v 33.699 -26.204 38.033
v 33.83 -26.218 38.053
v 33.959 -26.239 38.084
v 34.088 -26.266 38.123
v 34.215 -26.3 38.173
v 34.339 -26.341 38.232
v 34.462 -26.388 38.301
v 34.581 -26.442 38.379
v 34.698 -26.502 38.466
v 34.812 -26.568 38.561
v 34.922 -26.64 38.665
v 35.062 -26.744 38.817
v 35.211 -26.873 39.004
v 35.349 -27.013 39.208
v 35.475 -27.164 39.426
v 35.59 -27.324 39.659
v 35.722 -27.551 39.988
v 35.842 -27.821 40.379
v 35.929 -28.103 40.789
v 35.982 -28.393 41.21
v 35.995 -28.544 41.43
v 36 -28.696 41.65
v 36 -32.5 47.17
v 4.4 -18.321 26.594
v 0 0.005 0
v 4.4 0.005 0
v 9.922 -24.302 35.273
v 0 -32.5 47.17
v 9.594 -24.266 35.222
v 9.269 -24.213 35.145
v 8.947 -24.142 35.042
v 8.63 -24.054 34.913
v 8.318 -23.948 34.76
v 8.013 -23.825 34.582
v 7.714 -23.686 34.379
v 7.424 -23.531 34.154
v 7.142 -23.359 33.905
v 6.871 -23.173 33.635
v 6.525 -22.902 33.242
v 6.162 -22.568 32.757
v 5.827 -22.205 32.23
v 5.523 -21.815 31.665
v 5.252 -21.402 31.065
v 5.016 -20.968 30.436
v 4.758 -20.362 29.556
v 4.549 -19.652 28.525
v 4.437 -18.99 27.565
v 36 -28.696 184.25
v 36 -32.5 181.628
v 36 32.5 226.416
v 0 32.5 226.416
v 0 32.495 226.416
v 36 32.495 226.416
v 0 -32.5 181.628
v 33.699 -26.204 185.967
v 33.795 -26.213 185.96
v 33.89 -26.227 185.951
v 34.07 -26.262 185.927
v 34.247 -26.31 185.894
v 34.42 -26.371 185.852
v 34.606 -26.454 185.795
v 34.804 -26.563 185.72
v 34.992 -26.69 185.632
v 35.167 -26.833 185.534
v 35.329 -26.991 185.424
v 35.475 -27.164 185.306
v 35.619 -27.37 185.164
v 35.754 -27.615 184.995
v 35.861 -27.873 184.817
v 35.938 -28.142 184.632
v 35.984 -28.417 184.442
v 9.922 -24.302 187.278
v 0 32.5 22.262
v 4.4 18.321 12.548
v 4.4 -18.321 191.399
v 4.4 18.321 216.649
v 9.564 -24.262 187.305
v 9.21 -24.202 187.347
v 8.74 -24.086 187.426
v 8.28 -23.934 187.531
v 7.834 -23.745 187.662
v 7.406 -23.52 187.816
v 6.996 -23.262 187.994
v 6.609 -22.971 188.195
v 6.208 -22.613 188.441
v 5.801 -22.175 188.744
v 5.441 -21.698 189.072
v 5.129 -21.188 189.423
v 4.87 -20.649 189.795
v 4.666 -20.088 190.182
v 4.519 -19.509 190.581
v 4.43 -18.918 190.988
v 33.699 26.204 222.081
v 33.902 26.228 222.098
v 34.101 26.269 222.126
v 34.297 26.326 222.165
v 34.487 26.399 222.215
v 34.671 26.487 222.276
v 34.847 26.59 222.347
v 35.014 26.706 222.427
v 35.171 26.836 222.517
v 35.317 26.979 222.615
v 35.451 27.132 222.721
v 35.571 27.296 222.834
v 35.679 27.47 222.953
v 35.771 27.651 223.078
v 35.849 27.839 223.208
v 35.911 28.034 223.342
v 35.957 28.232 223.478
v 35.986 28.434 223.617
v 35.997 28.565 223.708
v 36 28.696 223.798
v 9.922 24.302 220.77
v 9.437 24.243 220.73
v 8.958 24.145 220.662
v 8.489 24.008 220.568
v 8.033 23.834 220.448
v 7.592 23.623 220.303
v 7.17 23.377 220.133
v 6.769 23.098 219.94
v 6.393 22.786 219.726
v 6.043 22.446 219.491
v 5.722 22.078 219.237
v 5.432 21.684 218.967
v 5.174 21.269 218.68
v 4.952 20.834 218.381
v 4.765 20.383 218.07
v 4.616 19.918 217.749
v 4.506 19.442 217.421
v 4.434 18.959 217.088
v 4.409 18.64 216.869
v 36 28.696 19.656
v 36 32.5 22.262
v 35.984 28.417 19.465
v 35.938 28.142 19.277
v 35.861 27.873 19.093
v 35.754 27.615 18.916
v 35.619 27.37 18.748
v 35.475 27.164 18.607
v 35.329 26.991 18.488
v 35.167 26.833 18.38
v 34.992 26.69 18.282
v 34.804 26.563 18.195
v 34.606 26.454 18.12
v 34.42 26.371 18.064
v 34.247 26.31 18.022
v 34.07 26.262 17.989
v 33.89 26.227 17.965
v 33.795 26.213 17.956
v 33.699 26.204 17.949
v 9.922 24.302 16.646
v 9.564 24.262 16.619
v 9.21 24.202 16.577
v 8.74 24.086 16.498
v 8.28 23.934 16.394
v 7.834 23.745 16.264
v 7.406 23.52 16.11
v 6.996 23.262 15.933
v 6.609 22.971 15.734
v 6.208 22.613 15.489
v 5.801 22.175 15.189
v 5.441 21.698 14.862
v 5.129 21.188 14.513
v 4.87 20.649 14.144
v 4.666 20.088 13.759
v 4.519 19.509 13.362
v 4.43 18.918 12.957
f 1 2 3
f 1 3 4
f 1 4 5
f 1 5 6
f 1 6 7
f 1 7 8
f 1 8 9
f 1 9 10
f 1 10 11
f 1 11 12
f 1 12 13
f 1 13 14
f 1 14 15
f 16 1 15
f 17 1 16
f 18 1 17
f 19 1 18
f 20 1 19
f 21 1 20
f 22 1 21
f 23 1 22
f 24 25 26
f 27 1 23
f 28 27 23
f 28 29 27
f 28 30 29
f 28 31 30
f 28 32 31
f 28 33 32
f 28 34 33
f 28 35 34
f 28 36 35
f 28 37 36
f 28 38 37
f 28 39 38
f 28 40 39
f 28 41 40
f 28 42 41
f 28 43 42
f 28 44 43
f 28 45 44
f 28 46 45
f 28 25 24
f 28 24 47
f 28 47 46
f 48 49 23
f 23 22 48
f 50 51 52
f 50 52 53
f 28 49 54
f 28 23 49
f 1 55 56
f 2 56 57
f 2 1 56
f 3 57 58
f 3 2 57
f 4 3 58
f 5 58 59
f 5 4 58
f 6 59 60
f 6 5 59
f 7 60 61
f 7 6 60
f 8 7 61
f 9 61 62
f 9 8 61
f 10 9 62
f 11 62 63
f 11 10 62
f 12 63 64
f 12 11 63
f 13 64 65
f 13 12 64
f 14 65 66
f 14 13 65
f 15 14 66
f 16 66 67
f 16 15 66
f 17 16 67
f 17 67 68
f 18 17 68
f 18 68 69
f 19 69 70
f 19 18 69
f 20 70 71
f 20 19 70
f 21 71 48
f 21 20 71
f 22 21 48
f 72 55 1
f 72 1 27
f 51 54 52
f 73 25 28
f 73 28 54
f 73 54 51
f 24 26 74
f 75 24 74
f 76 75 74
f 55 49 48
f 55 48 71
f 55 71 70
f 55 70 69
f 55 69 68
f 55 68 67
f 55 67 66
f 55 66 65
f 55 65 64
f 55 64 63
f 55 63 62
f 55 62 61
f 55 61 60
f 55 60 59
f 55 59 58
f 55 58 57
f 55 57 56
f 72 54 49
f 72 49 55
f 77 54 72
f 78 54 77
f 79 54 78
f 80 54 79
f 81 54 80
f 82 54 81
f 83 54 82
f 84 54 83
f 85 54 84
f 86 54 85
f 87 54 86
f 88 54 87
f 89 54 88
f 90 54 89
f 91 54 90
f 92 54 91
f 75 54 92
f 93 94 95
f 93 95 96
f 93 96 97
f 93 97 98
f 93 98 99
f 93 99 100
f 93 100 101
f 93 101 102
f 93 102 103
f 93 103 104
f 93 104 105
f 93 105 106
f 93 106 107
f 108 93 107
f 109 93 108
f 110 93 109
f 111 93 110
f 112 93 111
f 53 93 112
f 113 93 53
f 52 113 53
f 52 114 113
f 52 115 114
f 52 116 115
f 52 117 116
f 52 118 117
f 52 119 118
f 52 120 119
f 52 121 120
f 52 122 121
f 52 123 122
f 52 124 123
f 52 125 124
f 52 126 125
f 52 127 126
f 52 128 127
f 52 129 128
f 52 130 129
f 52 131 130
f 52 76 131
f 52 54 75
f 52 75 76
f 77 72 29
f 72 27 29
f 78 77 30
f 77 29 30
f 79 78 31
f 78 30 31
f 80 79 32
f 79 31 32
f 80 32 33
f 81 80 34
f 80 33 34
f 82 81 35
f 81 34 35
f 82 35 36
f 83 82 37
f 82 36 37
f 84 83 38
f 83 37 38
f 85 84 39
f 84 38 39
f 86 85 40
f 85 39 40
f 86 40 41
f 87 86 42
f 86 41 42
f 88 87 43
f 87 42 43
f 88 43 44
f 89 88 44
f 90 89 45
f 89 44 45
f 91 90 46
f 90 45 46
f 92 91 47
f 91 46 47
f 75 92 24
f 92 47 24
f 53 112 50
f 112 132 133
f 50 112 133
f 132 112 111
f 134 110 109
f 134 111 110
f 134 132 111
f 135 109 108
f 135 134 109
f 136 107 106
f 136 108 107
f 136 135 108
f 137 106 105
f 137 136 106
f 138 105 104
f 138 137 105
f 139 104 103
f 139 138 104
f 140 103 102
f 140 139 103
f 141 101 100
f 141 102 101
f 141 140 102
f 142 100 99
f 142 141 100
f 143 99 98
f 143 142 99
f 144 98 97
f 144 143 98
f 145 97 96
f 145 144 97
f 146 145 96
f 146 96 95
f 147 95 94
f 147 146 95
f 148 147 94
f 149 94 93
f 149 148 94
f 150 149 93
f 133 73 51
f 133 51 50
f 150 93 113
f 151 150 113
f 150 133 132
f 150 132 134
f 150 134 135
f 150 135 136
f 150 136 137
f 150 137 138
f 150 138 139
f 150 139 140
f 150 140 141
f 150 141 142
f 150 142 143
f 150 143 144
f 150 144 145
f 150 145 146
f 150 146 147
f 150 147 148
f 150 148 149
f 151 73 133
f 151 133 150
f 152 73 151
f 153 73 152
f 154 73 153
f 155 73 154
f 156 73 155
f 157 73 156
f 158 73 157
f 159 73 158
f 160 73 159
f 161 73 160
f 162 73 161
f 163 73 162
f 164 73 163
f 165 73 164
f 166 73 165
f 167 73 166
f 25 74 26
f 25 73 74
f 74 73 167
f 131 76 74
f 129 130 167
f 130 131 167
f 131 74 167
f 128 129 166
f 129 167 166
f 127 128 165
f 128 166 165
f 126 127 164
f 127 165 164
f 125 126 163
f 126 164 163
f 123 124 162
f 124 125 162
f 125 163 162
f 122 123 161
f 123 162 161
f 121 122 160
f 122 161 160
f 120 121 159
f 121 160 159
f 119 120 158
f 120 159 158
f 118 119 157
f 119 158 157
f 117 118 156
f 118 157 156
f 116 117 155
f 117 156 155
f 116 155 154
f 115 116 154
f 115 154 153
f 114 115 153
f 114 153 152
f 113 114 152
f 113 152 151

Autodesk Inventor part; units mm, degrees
ref_plane "Начальная плоскость" through (0, 0, 0) normal (0, 0, 1) x (1, 0, 0)
ref_plane "Конечная плоскость" through (0, 0, 226.4162) normal (0, 0, 1) x (1, 0, 0)
sketch "Эскиз" plane through (0, 0, 0) normal (0, 0, 1) x (1, 0, 0)
  line L0 (36, -32.5) -> (0, -32.5)
  line L1 (36, -32.5) -> (36, -28.696)
  line L2 (33.6994, -26.2039) -> (9.9215, -24.3017)
  line L3 (4.4, -18.3208) -> (4.4, 18.3208)
  line L4 (33.6994, 26.2039) -> (9.9215, 24.3017)
  line L5 (36, 28.696) -> (36, 32.5)
  line L6 (0, 32.5) -> (36, 32.5)
  line L7 (0, -32.5) -> (0, 32.5)
  arc A0 (4.4, -18.3208) -> (9.9215, -24.3017) centre (10.4, -18.3208) ccw
  arc A1 (9.9215, 24.3017) -> (4.4, 18.3208) centre (10.4, 18.3208) ccw
  arc A2 (36, -28.696) -> (33.6994, -26.2039) centre (33.5, -28.696) ccw
  arc A3 (33.6994, 26.2039) -> (36, 28.696) centre (33.5, 28.696) ccw
  line L8 (0, 45.5) -> (0, -45.5) construction
  line L9 (-7.2974, 0) -> (43.7847, 0) construction
  point P0 (36, -26.388)
  point P1 (4.4, -23.86)
  point P2 (4.4, 23.86)
  point P3 (36, 26.388)
  dimension "d3" = 36
  dimension "d5" = 4.4
  dimension "d7" = 65
  dimension "d9" = 8.64
  dimension "d11" = 8.64
  dimension "d13" = 6.112
  dimension "d15" = 6.112
  dimension "d22" = 6
  dimension "d23" = 2.5
  dimension "d24" = 32.5
  dimension "d25" = 0
extrude "Тело" add sketch "Эскиз" along normal up to surface (226.4162 mm away) from surface at 0
sketch "Sketch3" plane through (0, 0, 0) normal (0, 0, 1) x (1, 0, 0)
  line L0 (0, 0) -> (10, 0)
ref_plane "Work Plane7" through (0, 0, 0) normal (0, -1, 0) x (1, 0, 0)
sketch "Sketch4" plane through (0, 0, 0) normal (0, -1, 0) x (1, 0, 0)
  line L0 (-2, 0) -> (12, 0)
  line L1 (-2, 226.4162) -> (12, 226.4162)
  dimension "d29" = 226.4162
ref_plane "РабПлоскость8" through (36, 423.958, 290.4468) normal (0, 0.5652, -0.825) x (1, 0, 0)
split "Разделение1" plane through (36, 423.958, 290.4468) removes the side toward (0, 0.5652, -0.825)
ref_plane "РабПлоскость9" through (36, -65.6795, 158.7646) normal (0, -0.5674, 0.8234) x (1, 0, 0)
split "Разделение2" plane through (36, -65.6795, 158.7646) removes the side toward (0, -0.5674, 0.8234)
ref_plane "РабПлоскость10" through (-29, -95.3234, 138.3382) normal (0, -0.8234, -0.5674) x (1, 0, 0)
split "Разделение3" plane through (-29, -95.3234, 138.3382) removes the side toward (0, -0.8234, -0.5674)
equation "\"d3\" = b"
equation "\"d5\" = t1"
equation "\"d7\" = ParH"
equation "\"d9\" = msp_x1 + t2"
equation "\"d11\" = msp_x1 + t2"
equation "\"d13\" = -msp_x2 + t2"
equation "\"d15\" = -msp_x2 + t2"
equation "\"d22\" = R"
equation "\"d23\" = R1"
equation "\"d24\" = 0.5 * d7"
equation "\"d16\" = G_L"
equation "\"R1\" = 2.5"
equation "\"R\" = 6"
equation "\"t1\" = 4.4"
equation "\"t2\" = 7.2"
equation "\"ParH\" = 65"
equation "\"b\" = 36"
equation "\"msp_x1\" = 0.04 * b"
equation "\"msp_x2\" = -0.08 * t1 + 0.04 * b"
equation "\"G_L\" = d29"
equation "\"ex\" = 0"
equation "\"G_OFFSET_START\" = 0"
equation "\"G_OFFSET_END\" = 22.18382"
equation "\"d27\" = G_OFFSET_END + B_L"
equation "\"B_L\" = 204.2324"
properties part number "Швеллер 6.5U-226,42 ГОСТ 8240-97" material "Сталь, мягкая"
